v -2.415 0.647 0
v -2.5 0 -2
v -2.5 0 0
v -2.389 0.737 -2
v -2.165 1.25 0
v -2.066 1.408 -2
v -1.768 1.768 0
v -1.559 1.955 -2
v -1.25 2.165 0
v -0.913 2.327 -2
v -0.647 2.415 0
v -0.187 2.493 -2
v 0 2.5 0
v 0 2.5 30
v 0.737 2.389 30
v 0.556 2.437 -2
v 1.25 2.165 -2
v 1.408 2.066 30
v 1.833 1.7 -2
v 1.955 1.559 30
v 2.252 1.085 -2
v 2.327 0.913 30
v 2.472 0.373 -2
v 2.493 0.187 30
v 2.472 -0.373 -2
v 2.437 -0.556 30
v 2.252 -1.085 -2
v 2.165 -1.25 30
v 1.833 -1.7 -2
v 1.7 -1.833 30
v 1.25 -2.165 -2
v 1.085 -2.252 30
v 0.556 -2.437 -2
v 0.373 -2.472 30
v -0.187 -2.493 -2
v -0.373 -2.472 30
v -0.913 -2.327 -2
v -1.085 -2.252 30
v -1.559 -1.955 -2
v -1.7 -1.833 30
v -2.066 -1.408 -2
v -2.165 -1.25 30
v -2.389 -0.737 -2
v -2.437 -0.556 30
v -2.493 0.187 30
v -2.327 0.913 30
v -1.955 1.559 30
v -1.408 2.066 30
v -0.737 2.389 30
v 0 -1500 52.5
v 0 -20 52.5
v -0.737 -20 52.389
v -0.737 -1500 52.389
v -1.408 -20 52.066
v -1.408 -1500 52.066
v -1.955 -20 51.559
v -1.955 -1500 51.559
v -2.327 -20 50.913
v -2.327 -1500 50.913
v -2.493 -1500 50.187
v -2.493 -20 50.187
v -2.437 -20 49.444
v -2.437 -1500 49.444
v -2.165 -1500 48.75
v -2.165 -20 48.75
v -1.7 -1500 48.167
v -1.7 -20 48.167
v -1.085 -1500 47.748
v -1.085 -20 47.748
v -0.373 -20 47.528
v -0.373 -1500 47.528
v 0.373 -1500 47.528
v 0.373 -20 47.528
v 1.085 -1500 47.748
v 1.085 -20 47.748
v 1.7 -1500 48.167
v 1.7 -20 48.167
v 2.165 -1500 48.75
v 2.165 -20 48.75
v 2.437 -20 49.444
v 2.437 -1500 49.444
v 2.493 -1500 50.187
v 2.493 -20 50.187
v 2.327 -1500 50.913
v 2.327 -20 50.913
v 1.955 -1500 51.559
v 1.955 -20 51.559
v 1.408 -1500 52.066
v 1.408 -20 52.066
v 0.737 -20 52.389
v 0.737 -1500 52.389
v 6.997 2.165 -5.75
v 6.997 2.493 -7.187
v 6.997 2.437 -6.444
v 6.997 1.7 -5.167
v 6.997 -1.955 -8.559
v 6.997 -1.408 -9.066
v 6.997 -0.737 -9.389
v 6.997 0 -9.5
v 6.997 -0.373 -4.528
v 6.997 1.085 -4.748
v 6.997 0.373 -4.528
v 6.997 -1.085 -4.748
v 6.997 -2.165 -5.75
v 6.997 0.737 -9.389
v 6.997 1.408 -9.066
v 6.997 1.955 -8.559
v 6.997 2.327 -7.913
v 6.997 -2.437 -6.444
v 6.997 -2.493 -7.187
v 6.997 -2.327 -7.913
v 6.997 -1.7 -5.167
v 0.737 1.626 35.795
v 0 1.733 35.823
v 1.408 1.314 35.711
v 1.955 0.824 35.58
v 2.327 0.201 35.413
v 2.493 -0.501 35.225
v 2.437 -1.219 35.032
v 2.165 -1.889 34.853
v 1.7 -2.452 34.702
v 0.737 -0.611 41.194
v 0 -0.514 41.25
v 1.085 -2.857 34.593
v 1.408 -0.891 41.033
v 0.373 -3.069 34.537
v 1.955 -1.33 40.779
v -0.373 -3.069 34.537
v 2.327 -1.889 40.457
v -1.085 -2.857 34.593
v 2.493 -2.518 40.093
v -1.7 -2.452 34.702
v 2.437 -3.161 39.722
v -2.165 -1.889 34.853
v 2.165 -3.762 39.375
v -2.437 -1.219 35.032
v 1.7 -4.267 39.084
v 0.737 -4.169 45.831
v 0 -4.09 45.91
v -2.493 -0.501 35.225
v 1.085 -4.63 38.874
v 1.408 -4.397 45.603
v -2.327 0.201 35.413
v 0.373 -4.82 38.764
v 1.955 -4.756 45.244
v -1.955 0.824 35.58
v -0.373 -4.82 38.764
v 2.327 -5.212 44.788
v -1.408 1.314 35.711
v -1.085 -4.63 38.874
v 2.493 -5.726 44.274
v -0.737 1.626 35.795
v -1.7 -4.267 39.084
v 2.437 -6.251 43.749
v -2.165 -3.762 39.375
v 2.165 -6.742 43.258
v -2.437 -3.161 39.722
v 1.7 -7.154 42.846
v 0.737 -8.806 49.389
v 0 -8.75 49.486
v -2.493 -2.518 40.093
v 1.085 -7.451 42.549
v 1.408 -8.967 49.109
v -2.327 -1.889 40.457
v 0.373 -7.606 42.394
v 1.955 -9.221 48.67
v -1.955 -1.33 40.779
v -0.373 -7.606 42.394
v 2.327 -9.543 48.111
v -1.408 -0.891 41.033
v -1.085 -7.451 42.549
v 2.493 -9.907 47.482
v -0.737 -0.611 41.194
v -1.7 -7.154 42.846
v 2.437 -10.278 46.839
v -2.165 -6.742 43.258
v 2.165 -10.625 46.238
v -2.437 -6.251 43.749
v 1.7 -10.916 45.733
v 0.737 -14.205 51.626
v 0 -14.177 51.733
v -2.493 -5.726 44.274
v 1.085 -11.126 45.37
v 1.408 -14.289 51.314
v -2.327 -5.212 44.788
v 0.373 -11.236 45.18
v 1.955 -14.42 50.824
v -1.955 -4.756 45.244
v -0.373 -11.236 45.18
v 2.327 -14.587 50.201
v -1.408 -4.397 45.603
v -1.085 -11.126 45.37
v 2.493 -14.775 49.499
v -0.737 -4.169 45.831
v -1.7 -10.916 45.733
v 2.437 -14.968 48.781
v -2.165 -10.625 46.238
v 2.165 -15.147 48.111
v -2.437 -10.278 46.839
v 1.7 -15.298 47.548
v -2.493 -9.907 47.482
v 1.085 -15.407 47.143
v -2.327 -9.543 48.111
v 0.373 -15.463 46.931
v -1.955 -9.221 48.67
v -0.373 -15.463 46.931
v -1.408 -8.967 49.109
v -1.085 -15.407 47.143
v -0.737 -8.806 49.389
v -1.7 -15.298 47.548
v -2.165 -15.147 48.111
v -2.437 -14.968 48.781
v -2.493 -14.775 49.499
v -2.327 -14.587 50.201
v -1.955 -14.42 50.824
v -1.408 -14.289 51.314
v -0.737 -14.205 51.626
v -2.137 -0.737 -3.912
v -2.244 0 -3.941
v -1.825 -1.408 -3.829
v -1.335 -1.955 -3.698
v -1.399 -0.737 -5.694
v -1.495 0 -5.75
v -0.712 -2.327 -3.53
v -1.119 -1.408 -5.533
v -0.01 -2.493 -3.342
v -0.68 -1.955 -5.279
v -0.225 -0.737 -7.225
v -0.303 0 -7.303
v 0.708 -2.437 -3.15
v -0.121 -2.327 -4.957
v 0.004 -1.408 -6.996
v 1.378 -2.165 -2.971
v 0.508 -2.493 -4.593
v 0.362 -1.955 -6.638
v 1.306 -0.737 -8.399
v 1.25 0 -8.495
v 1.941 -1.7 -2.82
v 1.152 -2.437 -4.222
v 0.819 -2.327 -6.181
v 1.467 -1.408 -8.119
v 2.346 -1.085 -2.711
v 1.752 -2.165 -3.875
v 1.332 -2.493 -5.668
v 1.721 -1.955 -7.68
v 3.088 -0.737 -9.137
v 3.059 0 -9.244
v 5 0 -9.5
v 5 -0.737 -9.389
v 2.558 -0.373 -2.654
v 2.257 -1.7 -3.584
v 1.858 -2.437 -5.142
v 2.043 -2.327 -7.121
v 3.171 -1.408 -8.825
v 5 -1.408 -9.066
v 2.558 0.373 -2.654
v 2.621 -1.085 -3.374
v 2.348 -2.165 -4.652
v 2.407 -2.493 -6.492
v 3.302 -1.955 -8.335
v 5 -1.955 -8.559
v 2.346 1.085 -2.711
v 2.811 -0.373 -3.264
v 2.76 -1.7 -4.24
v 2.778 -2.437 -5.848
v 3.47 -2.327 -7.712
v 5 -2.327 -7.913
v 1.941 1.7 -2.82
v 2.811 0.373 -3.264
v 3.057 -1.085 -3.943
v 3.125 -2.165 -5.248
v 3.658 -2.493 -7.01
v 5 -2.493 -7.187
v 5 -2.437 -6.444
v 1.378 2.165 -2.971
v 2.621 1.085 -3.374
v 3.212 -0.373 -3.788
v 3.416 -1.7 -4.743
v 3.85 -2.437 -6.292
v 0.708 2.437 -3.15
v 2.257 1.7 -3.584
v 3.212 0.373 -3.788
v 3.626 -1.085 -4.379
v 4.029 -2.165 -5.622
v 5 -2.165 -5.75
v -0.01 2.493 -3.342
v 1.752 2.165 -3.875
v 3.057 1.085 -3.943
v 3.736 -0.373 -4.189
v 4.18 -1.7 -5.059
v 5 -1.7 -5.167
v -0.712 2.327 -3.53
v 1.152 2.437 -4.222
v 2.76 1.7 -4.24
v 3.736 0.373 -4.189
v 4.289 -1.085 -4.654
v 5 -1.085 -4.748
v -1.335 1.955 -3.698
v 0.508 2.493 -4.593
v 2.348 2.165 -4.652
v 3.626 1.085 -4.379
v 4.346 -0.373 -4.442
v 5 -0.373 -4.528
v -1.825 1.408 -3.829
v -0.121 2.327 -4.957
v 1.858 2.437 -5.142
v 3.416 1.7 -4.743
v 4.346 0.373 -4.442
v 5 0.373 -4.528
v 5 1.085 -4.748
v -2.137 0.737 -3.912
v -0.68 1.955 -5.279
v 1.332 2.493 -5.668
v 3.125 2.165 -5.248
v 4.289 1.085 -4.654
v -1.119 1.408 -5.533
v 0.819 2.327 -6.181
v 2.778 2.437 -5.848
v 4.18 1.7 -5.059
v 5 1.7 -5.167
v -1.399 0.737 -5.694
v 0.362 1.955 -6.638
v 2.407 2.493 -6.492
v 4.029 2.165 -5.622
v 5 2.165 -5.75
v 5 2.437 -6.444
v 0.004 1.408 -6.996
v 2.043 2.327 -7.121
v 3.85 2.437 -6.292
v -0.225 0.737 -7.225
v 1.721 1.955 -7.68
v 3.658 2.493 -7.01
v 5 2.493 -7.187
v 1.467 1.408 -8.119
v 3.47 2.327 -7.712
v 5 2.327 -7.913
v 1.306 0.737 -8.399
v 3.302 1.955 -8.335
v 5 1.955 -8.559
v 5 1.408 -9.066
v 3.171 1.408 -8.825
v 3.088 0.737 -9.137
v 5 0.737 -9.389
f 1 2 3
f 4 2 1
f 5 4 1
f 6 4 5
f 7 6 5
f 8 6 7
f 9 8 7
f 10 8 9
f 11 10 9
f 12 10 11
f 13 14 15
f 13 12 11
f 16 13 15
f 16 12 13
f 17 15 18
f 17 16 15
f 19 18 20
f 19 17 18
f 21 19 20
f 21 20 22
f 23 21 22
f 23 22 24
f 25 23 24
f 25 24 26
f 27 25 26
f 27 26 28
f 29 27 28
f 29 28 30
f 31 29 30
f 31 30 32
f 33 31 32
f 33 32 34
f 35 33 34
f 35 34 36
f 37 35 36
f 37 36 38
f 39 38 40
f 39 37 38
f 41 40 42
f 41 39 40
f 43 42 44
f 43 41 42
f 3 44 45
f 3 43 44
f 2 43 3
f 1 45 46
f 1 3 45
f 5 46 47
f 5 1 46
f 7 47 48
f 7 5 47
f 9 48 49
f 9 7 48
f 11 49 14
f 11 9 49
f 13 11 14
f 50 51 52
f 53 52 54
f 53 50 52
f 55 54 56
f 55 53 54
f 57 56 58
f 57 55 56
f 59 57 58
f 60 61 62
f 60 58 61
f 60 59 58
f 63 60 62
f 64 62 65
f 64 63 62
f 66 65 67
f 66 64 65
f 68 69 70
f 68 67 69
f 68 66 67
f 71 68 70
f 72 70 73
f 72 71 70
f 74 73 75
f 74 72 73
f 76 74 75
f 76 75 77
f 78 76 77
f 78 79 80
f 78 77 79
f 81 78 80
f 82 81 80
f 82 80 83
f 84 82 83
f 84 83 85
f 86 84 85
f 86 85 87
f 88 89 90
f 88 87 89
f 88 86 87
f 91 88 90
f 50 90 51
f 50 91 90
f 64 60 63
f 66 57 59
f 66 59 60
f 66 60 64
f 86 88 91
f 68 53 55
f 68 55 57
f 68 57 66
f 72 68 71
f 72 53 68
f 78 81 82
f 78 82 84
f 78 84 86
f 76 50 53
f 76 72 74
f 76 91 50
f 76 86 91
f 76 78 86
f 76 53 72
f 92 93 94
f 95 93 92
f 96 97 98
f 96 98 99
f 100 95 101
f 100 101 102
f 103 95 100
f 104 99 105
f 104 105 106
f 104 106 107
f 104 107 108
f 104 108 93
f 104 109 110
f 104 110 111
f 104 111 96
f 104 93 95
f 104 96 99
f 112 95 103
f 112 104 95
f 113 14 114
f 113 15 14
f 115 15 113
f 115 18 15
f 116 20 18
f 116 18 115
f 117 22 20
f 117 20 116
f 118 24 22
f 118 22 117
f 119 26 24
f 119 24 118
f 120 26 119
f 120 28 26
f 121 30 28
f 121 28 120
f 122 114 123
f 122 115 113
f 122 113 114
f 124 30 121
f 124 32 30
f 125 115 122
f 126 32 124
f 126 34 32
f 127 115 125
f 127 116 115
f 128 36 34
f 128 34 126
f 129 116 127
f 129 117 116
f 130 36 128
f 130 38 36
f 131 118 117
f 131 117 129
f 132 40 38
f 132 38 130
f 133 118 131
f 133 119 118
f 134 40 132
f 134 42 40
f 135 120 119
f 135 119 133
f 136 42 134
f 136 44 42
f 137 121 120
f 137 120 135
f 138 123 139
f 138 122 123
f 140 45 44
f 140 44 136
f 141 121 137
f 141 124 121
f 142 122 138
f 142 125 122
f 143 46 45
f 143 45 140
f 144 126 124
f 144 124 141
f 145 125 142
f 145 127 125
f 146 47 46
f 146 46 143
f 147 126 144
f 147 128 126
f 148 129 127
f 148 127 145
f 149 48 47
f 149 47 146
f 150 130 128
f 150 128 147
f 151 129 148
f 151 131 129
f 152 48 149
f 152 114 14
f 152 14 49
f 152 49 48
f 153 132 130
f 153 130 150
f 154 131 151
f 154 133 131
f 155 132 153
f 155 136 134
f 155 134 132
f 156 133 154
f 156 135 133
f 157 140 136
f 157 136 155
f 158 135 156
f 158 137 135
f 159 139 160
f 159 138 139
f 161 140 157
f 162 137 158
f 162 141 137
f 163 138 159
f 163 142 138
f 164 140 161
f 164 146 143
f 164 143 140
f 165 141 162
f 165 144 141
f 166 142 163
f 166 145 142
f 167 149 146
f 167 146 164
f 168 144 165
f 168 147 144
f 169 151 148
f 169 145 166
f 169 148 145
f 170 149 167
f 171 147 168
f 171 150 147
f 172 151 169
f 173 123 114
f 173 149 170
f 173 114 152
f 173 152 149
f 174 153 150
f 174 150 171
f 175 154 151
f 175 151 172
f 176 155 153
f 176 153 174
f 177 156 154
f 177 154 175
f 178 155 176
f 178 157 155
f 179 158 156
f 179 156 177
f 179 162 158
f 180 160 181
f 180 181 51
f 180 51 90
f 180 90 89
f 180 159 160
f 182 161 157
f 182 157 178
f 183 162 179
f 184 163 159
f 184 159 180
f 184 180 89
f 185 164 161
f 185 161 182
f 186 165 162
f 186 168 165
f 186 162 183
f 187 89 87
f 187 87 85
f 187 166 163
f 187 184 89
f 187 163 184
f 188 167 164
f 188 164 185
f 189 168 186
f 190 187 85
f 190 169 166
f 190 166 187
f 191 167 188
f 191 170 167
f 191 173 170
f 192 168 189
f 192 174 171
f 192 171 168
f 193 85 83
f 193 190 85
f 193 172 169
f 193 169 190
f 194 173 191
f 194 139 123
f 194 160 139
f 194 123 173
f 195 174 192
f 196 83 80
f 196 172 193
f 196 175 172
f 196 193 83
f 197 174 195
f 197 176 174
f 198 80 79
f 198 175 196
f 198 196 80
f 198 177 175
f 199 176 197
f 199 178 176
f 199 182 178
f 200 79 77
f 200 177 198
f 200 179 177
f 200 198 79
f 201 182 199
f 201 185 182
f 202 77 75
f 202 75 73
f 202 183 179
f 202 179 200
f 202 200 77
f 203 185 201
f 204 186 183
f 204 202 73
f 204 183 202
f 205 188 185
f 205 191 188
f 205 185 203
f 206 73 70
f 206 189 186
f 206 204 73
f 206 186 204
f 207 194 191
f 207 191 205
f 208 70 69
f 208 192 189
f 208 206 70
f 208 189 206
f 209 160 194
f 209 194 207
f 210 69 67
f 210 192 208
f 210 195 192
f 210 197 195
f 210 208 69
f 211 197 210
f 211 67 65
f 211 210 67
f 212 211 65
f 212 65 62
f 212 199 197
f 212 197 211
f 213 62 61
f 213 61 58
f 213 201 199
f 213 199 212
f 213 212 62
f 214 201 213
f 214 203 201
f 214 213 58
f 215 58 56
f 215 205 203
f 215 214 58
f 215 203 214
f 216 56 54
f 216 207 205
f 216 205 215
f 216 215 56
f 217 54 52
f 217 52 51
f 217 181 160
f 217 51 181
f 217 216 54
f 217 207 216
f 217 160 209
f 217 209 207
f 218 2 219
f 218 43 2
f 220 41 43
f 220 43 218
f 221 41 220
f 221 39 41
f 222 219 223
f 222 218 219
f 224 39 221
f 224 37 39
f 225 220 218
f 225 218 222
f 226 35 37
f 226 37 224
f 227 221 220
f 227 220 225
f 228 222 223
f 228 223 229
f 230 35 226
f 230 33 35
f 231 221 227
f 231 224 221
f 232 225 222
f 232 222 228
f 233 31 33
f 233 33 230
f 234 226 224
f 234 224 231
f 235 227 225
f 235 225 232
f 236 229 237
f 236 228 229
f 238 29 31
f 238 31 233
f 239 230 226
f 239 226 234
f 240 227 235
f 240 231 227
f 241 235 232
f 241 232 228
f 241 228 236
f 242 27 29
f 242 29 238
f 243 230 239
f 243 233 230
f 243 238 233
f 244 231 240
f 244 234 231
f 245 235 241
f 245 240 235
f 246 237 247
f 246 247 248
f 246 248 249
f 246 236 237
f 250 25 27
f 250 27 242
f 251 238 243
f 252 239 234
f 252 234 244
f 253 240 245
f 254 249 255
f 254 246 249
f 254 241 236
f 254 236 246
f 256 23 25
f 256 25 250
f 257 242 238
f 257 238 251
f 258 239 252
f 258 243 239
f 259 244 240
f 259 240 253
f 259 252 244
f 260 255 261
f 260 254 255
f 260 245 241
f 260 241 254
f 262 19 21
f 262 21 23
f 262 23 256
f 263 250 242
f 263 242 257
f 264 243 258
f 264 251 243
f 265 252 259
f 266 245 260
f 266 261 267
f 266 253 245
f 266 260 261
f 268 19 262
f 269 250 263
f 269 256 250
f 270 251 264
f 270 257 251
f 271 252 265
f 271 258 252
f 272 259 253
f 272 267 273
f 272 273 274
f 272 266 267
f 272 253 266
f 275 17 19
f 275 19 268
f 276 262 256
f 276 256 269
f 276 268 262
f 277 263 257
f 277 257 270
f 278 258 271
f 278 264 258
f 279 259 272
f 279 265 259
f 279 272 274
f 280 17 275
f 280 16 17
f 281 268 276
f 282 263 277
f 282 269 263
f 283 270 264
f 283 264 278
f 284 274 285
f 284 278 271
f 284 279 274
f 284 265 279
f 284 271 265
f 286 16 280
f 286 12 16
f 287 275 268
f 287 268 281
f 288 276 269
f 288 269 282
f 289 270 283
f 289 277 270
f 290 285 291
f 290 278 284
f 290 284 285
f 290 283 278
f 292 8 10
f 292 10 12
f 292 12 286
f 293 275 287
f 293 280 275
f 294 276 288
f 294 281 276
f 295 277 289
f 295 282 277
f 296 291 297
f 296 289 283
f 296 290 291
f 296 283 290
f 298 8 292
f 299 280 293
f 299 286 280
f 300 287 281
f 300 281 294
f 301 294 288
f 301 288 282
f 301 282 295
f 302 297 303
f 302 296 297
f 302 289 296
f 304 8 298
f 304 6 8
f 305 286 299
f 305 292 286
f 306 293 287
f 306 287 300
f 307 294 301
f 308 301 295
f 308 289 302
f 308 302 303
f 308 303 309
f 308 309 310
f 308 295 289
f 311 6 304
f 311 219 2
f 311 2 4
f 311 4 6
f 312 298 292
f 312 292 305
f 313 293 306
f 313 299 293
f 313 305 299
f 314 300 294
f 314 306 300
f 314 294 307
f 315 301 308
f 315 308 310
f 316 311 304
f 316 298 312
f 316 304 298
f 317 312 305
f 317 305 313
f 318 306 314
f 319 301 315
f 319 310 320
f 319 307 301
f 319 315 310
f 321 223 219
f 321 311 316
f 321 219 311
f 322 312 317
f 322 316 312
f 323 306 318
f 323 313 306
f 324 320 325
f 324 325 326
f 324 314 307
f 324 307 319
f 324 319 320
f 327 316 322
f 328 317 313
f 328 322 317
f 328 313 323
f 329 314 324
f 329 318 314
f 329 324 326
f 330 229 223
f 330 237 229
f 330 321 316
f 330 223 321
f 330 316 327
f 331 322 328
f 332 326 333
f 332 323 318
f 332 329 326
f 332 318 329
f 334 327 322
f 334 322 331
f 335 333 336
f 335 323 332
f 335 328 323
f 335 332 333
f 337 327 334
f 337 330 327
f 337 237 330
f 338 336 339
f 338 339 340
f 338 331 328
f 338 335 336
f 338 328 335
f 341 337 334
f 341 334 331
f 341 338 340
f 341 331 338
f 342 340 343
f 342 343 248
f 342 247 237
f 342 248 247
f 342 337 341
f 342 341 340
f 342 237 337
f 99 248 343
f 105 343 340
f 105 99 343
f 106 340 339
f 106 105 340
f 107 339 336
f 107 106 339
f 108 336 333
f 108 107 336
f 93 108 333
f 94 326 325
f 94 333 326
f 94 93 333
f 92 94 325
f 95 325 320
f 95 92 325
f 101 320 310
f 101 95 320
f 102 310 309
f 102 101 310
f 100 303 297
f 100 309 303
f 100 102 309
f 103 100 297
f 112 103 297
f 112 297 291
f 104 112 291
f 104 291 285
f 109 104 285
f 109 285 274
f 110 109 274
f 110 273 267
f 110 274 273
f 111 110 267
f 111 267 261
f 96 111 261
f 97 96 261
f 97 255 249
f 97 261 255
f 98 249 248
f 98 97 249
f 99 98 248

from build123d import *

# Parameters (mm, degrees)
VARREDURA1_PROFILE_R = 2.5
VARREDURA2_PROFILE_R = 2.5


with BuildPart() as part:
    # Varredura1: sweep along a path in Esboço1
    with BuildLine(Plane(origin=(0, 0, 0), x_dir=(0, 0, -1), z_dir=(1, 0, 0))) as varredura1_path:
        Line((0, 0), (-30, 0))
        ThreePointArc((-30, 0), (-44.142135624, -5.857864376), (-50, -20))
        Line((-50, -20), (-50, -1500))
    # Varredura1 profile (on start of the path) → Varredura1 (sweep)
    with BuildSketch(Plane(origin=(0, 0, 0), x_dir=(0, 1, 0), z_dir=(0, 0, 1))):
        Circle(VARREDURA1_PROFILE_R)
    sweep(path=varredura1_path.line)

    # Varredura2: sweep along a path in Esboço22
    with BuildLine(Plane(origin=(0, 0, 0), x_dir=(1, 0, 0), z_dir=(0, 1, 0))) as varredura2_path:
        Line((0, 0), (0, 2))
        ThreePointArc((0, 2), (1.464466094, 5.535533906), (5, 7))
        Line((5, 7), (6.99658834, 7))
    # Varredura2 profile (on start of the path) → Varredura2 (sweep)
    with BuildSketch(Plane(origin=(0, 0, 0), x_dir=(-1, 0, 0), z_dir=(0, 0, -1))):
        Circle(VARREDURA2_PROFILE_R)
    sweep(path=varredura2_path.line)


solid = part.part
